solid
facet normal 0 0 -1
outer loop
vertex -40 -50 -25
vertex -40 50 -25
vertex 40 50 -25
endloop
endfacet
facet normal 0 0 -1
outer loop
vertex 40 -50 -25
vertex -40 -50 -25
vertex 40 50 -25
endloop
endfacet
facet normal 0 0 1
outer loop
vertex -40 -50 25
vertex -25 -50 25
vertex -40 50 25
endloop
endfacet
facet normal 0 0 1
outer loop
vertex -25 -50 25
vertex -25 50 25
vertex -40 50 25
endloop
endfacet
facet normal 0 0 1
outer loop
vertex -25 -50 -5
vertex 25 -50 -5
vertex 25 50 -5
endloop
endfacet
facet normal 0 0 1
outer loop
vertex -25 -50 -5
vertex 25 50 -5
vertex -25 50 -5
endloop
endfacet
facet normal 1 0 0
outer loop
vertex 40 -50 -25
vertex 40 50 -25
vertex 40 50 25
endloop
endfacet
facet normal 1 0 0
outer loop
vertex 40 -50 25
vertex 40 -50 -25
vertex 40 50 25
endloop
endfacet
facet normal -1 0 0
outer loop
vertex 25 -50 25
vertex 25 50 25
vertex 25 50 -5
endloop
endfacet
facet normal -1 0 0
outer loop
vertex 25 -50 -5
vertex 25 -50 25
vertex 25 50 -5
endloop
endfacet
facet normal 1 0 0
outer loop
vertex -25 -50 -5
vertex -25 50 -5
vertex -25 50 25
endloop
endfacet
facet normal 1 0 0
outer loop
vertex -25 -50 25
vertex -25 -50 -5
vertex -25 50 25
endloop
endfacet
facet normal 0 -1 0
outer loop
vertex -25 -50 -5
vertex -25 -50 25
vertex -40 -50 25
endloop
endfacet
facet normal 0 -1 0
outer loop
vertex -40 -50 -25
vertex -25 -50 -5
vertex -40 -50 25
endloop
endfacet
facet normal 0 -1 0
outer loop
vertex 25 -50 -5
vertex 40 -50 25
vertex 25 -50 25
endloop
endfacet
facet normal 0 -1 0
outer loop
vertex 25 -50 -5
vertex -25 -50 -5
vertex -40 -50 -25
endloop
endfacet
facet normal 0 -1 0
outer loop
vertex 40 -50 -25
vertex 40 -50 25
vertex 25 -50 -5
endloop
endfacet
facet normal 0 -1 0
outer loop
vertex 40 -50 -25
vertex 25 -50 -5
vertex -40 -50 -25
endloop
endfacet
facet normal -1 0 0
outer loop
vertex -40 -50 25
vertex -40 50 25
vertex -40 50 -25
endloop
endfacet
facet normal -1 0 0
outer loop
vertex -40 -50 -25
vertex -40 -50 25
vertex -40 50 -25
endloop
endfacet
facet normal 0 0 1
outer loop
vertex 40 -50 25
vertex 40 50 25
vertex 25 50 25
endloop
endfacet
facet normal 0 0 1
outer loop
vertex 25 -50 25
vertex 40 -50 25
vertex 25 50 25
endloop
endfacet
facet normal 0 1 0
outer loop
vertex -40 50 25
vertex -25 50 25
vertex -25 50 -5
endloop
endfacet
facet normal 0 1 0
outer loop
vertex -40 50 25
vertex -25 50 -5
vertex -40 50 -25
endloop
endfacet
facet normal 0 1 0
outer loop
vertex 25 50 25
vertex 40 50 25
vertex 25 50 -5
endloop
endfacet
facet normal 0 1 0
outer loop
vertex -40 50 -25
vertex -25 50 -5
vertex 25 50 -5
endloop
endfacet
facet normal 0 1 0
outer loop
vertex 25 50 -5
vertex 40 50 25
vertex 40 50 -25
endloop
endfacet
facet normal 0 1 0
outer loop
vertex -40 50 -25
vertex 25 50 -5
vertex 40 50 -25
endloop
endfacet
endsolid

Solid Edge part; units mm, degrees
sketch "Sketch1" plane through (0, 0, 0) normal (0, -1, 0) x (1, 0, 0)
  line L0 (-40, -25) -> (40, -25)
  line L1 (40, -25) -> (40, 25)
  line L2 (40, 25) -> (-40, 25)
  line L3 (-40, 25) -> (-40, -25)
  dimension "D1" = 80
  dimension "D2" = 50
extrude "Protrusion1" add sketch "Sketch1" along normal mid plane 100
sketch "Sketch2" plane through (0, -50, 0) normal (0, -1, 0) x (1, 0, 0)
  line L0 (-25, 25) -> (25, 25)
  line L1 (25, 25) -> (25, -5)
  line L2 (25, -5) -> (-25, -5)
  line L3 (-25, -5) -> (-25, 25)
  dimension "D1" = 50
  dimension "D2" = 30
extrude "Cutout1" cut sketch "Sketch2" against normal through all
properties material "알루미늄, 1060"
